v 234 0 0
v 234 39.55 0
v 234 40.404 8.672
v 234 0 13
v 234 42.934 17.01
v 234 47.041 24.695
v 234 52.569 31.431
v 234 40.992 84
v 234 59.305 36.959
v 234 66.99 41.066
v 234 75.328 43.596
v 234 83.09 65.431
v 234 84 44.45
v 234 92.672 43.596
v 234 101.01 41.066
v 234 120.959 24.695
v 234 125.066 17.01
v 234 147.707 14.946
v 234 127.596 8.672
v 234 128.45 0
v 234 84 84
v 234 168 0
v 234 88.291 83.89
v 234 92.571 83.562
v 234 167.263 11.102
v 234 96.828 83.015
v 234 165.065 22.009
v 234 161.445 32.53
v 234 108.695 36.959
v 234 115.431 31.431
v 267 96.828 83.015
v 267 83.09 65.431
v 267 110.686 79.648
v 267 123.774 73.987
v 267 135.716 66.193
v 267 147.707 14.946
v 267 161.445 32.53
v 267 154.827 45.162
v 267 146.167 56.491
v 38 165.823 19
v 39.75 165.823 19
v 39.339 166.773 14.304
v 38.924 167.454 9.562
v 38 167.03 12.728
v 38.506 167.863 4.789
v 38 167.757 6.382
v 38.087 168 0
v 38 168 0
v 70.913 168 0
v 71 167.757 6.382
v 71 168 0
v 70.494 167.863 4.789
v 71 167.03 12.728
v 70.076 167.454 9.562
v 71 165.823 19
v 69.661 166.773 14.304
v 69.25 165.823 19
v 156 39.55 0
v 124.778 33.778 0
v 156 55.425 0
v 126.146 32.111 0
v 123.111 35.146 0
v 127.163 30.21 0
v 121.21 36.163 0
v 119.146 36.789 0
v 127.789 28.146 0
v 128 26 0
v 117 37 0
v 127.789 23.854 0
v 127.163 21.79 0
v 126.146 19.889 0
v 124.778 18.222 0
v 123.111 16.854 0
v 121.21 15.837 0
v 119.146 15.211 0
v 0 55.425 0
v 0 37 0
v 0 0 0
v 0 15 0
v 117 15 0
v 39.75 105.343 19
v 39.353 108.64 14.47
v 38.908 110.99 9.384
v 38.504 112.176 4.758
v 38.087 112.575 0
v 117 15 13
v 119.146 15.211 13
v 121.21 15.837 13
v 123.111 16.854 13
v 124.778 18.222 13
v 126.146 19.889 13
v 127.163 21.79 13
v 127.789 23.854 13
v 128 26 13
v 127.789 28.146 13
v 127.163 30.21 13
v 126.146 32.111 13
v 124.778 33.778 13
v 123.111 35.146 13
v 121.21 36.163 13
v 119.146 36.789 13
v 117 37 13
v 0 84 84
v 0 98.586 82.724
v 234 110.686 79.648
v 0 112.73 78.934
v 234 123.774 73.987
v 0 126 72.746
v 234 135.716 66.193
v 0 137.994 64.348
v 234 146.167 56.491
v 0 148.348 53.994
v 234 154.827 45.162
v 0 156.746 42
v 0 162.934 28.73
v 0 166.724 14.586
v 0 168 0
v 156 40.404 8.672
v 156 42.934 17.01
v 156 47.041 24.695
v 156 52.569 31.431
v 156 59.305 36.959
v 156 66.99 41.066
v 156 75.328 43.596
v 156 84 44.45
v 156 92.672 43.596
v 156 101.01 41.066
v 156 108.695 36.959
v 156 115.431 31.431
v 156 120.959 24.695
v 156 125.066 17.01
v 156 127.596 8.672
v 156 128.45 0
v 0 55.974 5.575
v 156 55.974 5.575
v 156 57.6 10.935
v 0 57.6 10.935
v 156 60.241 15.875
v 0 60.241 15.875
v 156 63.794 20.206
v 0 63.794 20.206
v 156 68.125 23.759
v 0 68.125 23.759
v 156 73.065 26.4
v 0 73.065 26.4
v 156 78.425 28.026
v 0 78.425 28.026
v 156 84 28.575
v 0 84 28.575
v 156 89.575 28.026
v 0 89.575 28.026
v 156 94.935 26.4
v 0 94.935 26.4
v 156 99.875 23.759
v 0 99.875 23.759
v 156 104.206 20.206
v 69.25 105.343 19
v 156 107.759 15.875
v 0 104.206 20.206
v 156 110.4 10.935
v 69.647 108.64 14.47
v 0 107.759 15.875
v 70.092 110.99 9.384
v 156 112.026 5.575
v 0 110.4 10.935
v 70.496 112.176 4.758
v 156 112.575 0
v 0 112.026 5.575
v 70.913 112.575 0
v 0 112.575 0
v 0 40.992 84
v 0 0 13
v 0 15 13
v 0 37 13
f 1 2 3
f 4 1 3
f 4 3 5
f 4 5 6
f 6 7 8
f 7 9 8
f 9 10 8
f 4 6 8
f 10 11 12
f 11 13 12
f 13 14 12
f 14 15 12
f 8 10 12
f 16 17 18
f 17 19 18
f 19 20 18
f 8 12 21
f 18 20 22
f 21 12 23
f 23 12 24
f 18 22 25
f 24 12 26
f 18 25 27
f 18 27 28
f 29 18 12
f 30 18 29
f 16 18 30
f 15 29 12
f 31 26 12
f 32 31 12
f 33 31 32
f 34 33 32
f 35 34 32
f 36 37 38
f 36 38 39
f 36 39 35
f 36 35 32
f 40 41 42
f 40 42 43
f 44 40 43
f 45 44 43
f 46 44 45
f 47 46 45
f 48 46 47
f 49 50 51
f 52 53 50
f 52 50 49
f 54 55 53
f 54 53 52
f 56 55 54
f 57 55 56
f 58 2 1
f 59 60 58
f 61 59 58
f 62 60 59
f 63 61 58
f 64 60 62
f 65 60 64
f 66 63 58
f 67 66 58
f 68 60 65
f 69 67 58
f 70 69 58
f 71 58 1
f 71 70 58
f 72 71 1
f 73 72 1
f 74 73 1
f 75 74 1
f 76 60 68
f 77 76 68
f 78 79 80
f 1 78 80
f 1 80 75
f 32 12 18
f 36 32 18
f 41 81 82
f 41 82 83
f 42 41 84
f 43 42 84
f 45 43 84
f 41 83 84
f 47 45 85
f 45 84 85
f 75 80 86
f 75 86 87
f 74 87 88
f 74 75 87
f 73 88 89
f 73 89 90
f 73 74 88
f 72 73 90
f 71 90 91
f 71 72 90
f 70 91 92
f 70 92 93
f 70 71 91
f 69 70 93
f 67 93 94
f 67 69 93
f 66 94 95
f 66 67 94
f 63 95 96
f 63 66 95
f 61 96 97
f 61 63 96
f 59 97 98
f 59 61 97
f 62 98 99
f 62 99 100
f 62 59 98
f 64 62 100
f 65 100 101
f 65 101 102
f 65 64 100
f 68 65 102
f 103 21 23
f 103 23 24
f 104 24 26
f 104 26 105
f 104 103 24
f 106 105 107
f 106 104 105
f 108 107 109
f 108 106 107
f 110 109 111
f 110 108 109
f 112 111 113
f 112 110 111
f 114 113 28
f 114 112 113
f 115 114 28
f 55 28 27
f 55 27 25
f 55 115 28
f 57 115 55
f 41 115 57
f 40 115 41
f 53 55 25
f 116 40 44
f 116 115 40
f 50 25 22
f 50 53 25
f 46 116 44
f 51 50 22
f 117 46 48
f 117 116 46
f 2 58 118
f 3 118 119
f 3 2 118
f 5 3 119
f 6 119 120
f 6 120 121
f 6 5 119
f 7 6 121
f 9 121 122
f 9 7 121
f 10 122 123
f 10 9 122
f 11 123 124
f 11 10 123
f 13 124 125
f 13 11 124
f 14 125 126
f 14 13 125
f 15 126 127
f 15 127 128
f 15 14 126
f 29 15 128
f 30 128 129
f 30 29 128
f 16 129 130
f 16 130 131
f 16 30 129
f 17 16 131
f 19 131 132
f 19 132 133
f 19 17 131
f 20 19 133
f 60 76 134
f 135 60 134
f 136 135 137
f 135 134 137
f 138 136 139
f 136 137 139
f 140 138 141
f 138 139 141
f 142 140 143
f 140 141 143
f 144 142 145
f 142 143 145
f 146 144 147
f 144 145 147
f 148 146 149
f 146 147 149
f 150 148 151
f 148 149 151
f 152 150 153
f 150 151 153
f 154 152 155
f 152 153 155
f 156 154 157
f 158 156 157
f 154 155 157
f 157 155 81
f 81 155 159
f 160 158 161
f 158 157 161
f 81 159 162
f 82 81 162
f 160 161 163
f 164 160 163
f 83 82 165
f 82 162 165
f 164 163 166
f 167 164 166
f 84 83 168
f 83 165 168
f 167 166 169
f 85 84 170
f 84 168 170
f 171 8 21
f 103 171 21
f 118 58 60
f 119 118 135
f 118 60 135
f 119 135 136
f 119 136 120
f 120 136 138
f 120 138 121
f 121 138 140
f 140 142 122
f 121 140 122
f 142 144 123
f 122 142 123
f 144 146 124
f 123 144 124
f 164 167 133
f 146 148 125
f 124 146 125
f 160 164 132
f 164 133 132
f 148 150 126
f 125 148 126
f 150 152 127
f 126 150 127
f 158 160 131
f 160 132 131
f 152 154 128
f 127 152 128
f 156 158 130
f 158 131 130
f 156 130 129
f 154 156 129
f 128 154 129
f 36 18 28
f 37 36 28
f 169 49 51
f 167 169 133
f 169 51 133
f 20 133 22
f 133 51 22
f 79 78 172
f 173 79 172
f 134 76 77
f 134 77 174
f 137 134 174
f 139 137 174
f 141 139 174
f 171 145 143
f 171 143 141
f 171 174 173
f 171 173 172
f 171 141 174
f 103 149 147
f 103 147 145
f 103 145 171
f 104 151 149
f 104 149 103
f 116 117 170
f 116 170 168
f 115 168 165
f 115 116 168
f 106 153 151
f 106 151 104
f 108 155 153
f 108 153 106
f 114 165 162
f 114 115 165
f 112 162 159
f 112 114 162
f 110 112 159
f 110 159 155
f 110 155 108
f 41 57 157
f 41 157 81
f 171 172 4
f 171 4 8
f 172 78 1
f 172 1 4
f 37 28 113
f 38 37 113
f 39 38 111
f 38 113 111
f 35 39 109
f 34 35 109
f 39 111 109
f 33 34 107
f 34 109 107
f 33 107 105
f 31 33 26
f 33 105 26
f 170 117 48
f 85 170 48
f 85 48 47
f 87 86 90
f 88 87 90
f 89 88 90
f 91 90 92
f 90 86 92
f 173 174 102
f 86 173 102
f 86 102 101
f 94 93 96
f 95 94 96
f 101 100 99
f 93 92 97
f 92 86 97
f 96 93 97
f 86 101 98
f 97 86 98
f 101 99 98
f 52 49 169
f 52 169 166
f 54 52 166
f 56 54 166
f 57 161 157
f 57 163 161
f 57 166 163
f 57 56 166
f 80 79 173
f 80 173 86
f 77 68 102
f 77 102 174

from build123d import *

# Parameters (mm, degrees)
BOSS_EXTRUDE1_DEPTH = 234
CUT_EXTRUDE1_DEPTH  = 78
BOSS_EXTRUDE2_DEPTH = 33
CUT_EXTRUDE2_DEPTH  = 13
SKETCH6_W           = 33
SKETCH6_H           = 84.469943203
CUT_EXTRUDE3_DEPTH  = 19
CHAMFER2_SIZE       = 1.749773271
CHAMFER2_SIZE_2     = 20


with BuildPart() as part:
    # Sketch1 → Boss-Extrude1 (new body)
    with BuildSketch(Plane(origin=(0, 0, 0), x_dir=(0, 0, -1), z_dir=(1, 0, 0))):
        with BuildLine():
            Line((0, 0), (-13, 0))
            Line((-13, 0), (-84, 40.991869112))
            Line((-84, 40.991869112), (-84, 84))
            ThreePointArc((-84, 84), (-59.39696962, 143.39696962), (0, 168))
            Line((0, 168), (0, 112.575))
            ThreePointArc((0, 112.575), (-28.575, 84), (0, 55.425))
            Line((0, 55.425), (0, 0))
        make_face()
    extrude(amount=BOSS_EXTRUDE1_DEPTH)

    # Sketch2 → Cut-Extrude1 (cut)
    with BuildSketch(Plane(origin=(234, 0, 0), x_dir=(0, 0, -1), z_dir=(1, 0, 0))):
        with BuildLine():
            Line((0, 128.45), (0, 39.55))
            ThreePointArc((0, 39.55), (-44.45, 84), (0, 128.45))
        make_face()
    extrude(amount=-CUT_EXTRUDE1_DEPTH, mode=Mode.SUBTRACT)

    # Sketch3 → Boss-Extrude2 (add)
    with BuildSketch(Plane(origin=(234, 0, 0), x_dir=(0, 0, -1), z_dir=(1, 0, 0))):
        with BuildLine():
            Line((-83.014649379, 96.828405531), (-65.430668922, 83.090294344))
            Line((-65.430668922, 83.090294344), (-14.946427946, 147.707176139))
            Line((-14.946427946, 147.707176139), (-32.530408402, 161.445287327))
            ThreePointArc((-32.530408402, 161.445287327), (-66.192903303, 135.715563927), (-83.014649379, 96.828405531))
        make_face()
    extrude(amount=BOSS_EXTRUDE2_DEPTH)

    # Sketch4 → Cut-Extrude2 (cut)
    with BuildSketch(Plane(origin=(0, 0, 0), x_dir=(-1, 0, 0), z_dir=(0, 0, -1))):
        with BuildLine():
            Line((0, 15), (-117, 15))
            ThreePointArc((-117, 15), (-128, 26), (-117, 37))
            Line((-117, 37), (0, 37))
            ThreePointArc((0, 37), (11, 26), (0, 15))
        make_face()
    extrude(amount=-CUT_EXTRUDE2_DEPTH, mode=Mode.SUBTRACT)

    # Sketch6 → Cut-Extrude3 (cut)
    with BuildSketch(Plane(origin=(0, 0, 0), x_dir=(-1, 0, 0), z_dir=(0, 0, -1))):
        with Locations((-54.5, 125.765028398)):
            Rectangle(SKETCH6_W, SKETCH6_H)
    extrude(amount=-CUT_EXTRUDE3_DEPTH, mode=Mode.SUBTRACT)

    # Chamfer2
    # the kernel refuses this chamfer: 20, 1.749773271 mm, written as the material it adds along each edge
    with BuildSketch(Plane(origin=(38, 53.350481829, 19), x_dir=(0.9159861691531124, 0, 0.4012098427509048), z_dir=(0, 1, 0))) as chamfer2_piece_1_section:
        Polygon((CHAMFER2_SIZE * 0.915986168901, CHAMFER2_SIZE * 0.40120984264), (-CHAMFER2_SIZE_2 * 0.401209842751, CHAMFER2_SIZE_2 * 0.915986169153), (0, 0), align=None)
    chamfer2_piece_1 = extrude(amount=164.465179425, mode=Mode.PRIVATE)
    chamfer2_piece_1 = chamfer2_piece_1 - Plane(origin=(38.476894186, 84, 0), x_dir=(0, 1, 0), z_dir=(-1, 0, 0)) * Cylinder(28.575, 403, mode=Mode.PRIVATE)
    chamfer2_piece_1 = split(chamfer2_piece_1, bisect_by=Plane(origin=(38.476894186, 56.471998141, 0), z_dir=(0, 0, 1)), keep=Keep.TOP, mode=Mode.PRIVATE)
    chamfer2_piece_1 = chamfer2_piece_1 & Plane(origin=(38.476894186, 84, 0), x_dir=(0, 0, 1), z_dir=(-1, 0, 0)) * Cylinder(84, 403, mode=Mode.PRIVATE)
    add(chamfer2_piece_1)
    with BuildSketch(Plane(origin=(71, 217.815661254, 19), x_dir=(0.003352615794032912, 0, -0.9999943799678763), z_dir=(0, -1, 0))) as chamfer2_piece_2_section:
        Polygon((CHAMFER2_SIZE_2 * 0.999994379968, -CHAMFER2_SIZE_2 * 0.00335261579403), (-CHAMFER2_SIZE * 0.00335261579311, -CHAMFER2_SIZE * 0.999994379693), (0, 0), align=None)
    chamfer2_piece_2 = extrude(amount=164.465179425, mode=Mode.PRIVATE)
    chamfer2_piece_2 = chamfer2_piece_2 - Plane(origin=(70.625797468, 84, 0), x_dir=(0, 1, 0), z_dir=(-1, 0, 0)) * Cylinder(28.575, 409, mode=Mode.PRIVATE)
    chamfer2_piece_2 = chamfer2_piece_2 & Plane(origin=(70.625797468, 84, 0), x_dir=(0, 0, 1), z_dir=(-1, 0, 0)) * Cylinder(84, 409, mode=Mode.PRIVATE)
    chamfer2_piece_2 = split(chamfer2_piece_2, bisect_by=Plane(origin=(70.625797468, 138.170488536, 0), z_dir=(0, 0, 1)), keep=Keep.TOP, mode=Mode.PRIVATE)
    add(chamfer2_piece_2)


solid = part.part
